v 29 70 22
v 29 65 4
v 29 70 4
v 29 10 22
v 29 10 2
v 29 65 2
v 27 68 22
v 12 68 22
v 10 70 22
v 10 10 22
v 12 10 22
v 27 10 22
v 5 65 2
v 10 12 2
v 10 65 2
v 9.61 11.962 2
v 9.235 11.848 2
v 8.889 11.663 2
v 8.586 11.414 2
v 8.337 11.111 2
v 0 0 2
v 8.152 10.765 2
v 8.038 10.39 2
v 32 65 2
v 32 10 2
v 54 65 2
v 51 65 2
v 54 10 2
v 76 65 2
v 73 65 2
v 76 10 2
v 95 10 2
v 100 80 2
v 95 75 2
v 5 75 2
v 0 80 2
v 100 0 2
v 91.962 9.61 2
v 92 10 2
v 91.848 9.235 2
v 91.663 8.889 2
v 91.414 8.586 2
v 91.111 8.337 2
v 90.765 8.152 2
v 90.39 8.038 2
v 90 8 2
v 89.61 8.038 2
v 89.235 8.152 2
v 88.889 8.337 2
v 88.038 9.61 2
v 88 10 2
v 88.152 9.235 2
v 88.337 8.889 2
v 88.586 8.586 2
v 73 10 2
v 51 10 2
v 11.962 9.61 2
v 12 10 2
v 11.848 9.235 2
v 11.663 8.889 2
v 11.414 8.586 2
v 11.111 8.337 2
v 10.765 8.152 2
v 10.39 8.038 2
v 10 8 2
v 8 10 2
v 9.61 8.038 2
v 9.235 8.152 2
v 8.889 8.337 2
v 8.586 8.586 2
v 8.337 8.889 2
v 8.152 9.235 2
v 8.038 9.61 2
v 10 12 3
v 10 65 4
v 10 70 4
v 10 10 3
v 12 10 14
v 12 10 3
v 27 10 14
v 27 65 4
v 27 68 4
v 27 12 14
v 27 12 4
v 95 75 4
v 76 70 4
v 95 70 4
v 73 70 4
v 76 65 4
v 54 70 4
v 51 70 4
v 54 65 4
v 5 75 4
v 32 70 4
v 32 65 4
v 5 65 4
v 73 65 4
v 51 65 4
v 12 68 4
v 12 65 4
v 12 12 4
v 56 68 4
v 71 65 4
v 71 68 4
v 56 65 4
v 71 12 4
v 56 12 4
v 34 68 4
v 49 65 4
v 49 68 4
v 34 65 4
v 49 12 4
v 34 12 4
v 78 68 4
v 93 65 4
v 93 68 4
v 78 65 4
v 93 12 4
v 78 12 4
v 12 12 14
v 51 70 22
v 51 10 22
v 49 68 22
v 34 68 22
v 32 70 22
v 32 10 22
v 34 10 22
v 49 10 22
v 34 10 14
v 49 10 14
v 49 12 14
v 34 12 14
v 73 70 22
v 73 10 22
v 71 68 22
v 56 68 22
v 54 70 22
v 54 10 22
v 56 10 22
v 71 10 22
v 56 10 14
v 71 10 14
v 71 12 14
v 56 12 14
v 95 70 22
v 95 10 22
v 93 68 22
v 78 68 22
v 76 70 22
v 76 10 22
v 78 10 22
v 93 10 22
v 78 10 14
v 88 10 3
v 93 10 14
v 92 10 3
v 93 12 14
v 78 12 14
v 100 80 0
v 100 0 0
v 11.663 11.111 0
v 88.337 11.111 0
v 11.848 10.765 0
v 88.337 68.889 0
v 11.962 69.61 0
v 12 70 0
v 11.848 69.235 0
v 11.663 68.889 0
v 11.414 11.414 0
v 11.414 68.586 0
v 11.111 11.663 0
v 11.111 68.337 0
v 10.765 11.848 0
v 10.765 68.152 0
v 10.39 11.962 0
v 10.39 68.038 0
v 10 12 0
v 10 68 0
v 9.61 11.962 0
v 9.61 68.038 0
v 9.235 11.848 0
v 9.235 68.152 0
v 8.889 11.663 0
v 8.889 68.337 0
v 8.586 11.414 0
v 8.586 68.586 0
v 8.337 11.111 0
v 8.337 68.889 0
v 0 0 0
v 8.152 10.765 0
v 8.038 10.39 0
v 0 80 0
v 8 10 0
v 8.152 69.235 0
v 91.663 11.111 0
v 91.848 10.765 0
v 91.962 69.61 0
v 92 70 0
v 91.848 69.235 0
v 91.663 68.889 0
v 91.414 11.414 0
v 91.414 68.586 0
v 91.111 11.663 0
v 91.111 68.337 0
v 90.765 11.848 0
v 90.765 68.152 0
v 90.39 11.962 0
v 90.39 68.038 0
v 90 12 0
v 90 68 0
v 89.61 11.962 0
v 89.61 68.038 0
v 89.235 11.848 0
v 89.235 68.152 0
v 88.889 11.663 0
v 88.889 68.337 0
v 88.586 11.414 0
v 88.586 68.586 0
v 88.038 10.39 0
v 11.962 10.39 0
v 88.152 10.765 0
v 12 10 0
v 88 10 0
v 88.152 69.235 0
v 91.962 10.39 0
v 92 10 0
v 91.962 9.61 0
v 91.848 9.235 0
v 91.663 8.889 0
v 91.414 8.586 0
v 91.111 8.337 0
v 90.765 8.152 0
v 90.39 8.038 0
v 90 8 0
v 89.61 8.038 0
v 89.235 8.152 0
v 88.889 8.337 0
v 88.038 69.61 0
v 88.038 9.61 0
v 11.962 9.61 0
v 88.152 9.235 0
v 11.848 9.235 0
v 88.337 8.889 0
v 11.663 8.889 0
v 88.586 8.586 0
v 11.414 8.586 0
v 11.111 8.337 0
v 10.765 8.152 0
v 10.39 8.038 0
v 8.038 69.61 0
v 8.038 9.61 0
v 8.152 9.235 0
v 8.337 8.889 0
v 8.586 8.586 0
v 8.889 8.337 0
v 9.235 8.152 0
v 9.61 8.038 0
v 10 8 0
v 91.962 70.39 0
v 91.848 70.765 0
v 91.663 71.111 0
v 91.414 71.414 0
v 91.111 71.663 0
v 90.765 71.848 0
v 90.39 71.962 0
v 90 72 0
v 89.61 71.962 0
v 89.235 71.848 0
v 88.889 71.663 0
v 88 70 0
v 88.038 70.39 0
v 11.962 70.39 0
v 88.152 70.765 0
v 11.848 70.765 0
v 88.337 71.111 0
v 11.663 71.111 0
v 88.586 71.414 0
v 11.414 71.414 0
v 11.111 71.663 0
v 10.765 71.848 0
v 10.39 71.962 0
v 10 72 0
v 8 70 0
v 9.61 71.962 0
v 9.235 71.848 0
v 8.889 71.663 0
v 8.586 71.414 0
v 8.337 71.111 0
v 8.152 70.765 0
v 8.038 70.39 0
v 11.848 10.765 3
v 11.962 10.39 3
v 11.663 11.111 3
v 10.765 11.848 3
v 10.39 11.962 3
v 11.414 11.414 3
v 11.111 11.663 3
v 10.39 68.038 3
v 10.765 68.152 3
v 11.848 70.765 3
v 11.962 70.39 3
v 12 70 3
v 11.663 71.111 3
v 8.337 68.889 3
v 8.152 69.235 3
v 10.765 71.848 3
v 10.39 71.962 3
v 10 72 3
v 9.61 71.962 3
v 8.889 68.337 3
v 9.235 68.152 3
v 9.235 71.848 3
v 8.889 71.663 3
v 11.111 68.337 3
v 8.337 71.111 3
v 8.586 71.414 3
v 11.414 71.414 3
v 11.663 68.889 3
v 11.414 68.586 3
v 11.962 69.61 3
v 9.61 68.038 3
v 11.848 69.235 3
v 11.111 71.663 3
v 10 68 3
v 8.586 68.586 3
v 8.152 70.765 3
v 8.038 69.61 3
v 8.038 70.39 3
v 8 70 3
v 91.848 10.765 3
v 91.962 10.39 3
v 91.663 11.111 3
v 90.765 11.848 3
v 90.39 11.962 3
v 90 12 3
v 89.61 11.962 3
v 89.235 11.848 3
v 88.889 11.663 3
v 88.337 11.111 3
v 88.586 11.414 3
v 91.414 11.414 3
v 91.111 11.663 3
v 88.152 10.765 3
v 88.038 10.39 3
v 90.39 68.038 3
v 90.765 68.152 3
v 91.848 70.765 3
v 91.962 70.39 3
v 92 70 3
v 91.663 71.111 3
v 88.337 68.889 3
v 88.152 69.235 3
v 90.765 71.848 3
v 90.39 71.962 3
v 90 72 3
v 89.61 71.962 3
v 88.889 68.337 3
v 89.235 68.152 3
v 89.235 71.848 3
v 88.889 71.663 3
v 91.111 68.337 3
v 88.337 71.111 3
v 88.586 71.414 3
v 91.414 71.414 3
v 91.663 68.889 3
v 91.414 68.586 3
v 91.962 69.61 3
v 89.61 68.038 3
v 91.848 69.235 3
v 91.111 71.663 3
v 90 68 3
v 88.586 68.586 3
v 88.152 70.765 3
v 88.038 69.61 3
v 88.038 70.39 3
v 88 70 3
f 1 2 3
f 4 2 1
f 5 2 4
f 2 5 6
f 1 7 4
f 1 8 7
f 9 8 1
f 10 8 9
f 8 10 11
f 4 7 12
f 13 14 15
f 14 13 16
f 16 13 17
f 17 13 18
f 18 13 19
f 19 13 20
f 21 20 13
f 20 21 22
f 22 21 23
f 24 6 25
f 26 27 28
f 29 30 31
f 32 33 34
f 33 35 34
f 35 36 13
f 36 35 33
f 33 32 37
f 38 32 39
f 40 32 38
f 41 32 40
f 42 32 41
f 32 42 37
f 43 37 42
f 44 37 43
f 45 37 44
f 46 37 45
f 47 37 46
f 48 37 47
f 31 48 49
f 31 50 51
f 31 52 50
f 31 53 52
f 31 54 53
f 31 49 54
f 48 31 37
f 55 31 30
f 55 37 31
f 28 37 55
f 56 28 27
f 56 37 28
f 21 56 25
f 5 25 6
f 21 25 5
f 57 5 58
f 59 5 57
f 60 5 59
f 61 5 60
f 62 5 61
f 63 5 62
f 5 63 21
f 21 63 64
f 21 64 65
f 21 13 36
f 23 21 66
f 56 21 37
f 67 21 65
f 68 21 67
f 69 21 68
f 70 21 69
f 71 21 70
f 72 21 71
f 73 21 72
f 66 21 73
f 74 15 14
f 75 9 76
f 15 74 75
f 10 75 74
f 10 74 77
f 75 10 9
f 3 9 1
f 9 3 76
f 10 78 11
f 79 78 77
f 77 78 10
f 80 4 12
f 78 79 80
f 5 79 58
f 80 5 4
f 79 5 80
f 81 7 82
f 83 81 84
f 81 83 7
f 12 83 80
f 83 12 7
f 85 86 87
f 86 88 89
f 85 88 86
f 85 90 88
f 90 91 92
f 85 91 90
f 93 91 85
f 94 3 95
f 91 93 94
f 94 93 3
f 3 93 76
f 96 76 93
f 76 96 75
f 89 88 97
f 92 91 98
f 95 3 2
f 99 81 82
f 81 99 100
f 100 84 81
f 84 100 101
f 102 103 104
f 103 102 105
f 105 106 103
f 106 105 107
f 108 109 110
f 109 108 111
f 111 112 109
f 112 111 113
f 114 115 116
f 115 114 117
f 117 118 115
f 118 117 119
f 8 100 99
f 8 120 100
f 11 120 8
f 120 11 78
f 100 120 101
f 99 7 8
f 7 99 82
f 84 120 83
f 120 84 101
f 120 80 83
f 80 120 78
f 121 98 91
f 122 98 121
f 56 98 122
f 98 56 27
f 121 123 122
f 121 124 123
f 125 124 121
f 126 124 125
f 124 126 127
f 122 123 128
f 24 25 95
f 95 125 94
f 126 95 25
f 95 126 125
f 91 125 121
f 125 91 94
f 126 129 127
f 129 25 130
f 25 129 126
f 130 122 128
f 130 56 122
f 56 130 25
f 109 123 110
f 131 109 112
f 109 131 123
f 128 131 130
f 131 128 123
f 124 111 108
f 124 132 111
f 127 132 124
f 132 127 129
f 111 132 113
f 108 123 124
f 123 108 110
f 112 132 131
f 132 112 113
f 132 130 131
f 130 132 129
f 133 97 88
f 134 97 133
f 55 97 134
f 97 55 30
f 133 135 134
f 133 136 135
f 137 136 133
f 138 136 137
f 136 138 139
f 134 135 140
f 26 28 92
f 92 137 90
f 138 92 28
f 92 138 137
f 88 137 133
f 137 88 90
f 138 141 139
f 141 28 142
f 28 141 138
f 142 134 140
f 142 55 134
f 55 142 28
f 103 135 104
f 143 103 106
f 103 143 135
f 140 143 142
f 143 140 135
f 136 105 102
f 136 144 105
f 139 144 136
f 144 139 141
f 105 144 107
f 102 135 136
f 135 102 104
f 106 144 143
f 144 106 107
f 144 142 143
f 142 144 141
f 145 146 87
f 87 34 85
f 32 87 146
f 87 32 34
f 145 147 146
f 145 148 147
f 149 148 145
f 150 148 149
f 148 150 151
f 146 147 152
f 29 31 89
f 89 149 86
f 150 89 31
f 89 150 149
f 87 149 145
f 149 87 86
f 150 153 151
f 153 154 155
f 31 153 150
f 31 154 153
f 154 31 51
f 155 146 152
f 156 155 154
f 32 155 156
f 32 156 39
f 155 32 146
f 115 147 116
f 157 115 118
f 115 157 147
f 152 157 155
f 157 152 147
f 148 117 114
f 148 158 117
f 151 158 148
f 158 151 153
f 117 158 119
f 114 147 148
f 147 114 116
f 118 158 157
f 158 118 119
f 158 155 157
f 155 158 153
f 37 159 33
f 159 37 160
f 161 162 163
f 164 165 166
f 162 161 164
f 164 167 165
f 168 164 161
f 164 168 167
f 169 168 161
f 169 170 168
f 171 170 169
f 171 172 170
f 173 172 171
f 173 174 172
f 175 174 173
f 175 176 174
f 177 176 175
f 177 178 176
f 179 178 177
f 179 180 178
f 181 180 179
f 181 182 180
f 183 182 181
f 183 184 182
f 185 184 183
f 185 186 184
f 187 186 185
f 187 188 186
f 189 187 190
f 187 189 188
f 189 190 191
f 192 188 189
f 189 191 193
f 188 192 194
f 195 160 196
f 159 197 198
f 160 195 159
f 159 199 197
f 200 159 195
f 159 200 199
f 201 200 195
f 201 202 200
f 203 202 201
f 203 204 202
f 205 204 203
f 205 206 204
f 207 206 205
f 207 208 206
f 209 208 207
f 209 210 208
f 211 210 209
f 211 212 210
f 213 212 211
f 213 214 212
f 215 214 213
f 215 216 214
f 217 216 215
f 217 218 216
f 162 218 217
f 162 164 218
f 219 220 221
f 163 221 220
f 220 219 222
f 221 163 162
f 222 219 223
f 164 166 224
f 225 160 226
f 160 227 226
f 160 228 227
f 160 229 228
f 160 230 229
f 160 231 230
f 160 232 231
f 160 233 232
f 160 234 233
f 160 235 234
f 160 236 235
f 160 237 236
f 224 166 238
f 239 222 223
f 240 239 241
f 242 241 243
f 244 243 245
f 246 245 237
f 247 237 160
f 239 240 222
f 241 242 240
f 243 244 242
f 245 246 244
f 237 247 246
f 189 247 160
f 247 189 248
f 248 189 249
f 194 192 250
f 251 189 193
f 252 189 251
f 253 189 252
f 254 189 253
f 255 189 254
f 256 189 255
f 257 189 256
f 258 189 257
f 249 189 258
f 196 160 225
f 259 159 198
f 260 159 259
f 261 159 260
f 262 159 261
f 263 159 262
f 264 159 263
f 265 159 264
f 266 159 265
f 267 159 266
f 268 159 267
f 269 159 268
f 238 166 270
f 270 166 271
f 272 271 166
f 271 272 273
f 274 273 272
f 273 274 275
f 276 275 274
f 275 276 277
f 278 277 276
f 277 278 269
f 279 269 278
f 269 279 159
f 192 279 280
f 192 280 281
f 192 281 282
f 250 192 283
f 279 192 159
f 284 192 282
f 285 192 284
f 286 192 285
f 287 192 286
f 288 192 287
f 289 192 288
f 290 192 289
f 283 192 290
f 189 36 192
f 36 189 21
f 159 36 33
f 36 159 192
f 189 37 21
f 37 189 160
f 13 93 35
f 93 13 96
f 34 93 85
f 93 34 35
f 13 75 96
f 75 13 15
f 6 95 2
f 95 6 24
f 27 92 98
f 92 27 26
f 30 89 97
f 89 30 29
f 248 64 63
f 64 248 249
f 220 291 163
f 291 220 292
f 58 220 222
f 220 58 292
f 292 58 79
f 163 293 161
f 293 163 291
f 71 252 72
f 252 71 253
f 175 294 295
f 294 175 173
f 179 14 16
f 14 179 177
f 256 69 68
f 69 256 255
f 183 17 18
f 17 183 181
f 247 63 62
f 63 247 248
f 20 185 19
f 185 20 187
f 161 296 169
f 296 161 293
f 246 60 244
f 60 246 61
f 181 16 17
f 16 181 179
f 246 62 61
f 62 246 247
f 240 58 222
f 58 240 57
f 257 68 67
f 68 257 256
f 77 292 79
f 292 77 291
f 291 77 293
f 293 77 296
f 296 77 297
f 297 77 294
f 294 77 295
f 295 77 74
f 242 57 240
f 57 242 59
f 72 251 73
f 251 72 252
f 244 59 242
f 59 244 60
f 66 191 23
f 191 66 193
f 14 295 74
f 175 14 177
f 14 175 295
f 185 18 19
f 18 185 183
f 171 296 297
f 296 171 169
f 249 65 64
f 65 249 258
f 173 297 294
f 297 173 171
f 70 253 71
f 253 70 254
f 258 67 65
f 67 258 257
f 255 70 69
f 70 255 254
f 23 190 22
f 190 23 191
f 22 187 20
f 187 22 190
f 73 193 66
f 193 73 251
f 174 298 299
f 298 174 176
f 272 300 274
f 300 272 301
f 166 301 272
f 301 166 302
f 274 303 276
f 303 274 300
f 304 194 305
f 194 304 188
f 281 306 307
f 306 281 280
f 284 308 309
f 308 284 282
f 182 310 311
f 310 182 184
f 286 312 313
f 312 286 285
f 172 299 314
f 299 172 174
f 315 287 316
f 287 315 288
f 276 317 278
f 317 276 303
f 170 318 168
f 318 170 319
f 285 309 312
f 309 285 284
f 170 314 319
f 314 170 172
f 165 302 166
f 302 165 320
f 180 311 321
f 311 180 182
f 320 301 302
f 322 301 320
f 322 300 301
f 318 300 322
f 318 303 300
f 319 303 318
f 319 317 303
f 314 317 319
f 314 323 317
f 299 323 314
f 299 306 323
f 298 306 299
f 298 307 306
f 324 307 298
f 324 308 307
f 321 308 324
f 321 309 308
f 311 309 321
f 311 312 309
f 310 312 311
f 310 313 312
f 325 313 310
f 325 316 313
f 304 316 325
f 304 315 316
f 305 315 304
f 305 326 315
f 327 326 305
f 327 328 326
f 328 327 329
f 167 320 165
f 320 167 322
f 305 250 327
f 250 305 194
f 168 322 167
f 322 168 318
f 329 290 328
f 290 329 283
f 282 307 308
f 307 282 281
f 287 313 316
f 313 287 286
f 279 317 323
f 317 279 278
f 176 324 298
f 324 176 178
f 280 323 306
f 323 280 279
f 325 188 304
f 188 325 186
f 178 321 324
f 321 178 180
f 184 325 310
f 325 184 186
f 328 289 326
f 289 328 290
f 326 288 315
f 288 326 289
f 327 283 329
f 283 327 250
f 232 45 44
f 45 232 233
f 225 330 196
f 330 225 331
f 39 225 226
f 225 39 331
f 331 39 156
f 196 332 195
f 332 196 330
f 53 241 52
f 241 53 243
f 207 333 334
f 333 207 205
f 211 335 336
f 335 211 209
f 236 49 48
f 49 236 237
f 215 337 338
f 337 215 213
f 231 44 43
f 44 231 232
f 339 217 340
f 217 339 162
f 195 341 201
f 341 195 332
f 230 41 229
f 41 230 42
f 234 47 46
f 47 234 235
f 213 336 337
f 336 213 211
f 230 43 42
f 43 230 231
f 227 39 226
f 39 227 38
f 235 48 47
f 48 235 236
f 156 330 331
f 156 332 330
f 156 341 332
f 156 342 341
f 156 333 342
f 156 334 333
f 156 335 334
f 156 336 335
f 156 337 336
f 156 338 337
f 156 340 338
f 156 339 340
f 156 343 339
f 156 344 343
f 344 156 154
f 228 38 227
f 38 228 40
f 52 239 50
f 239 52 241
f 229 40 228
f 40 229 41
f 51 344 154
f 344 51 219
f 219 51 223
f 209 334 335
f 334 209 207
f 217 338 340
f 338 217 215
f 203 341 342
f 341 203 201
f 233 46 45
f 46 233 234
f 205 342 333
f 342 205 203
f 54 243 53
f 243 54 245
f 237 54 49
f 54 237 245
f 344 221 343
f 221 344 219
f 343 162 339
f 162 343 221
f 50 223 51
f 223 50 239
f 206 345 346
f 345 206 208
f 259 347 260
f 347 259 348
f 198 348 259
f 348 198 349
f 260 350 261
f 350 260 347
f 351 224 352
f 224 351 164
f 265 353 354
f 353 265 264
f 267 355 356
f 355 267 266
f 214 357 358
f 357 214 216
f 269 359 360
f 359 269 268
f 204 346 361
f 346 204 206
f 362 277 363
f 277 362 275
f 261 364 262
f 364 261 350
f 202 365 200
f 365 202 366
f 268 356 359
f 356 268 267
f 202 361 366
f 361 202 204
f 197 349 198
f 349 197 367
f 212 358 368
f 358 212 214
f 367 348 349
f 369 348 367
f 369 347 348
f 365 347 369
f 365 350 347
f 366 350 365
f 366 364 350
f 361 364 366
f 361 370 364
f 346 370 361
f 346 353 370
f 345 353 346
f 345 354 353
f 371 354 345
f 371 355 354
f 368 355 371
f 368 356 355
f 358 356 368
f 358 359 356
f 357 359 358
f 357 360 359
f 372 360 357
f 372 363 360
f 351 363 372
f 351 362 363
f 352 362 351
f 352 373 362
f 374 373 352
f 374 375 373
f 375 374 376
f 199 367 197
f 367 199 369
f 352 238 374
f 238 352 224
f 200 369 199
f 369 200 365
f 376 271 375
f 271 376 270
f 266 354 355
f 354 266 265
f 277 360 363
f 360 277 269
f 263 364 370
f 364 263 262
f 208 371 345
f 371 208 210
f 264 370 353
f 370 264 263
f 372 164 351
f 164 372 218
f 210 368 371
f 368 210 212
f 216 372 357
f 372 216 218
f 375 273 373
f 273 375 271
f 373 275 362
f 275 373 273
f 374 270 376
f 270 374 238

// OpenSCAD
// Example: Cable Organizer Using Config File
// This demonstrates how to use config.scad for consistent customization

// Include the global configuration
// Uncomment the line below to use shared config:
// use <config.scad>

// If using config.scad, these values come from there.
// If not using config, these are the defaults:

// From config (or use these defaults)
wall_thickness = 2;
base_width = 80;
base_length = 100;
base_height = 2;
channel_width = 15;
channel_height = 20;
num_channels = 4;
mounting_hole_diameter = 4;

// Example: To use config values, uncomment use statement above
// Then these would automatically use config.scad values:
// wall_thickness (from config)
// base_width = cable_org_width (from config)
// base_length = cable_org_length (from config)
// num_channels = cable_org_channels (from config)

// Main module
module cable_organizer() {
    difference() {
        union() {
            // Base plate
            cube([base_length, base_width, base_height]);
            
            // Channels for cables
            for (i = [0:num_channels-1]) {
                translate([10 + i * 22, 10, base_height]) {
                    difference() {
                        // Outer channel
                        cube([channel_width + wall_thickness * 2, 
                              base_width - 20, 
                              channel_height]);
                        
                        // Inner channel cutout
                        translate([wall_thickness, wall_thickness, wall_thickness]) {
                            cube([channel_width, 
                                  base_width - 20 - wall_thickness * 2, 
                                  channel_height]);
                        }
                        
                        // Front opening (entrance for cables)
                        translate([wall_thickness, 0, channel_height - 8]) {
                            cube([channel_width, wall_thickness + 1, 10]);
                        }
                    }
                }
            }
            
            // Label area
            translate([5, base_width - 15, base_height]) {
                cube([base_length - 10, 10, 2]);
            }
        }
        
        // Mounting holes
        for (x = [10, base_length - 10]) {
            for (y = [10, base_width - 10]) {
                translate([x, y, -1]) {
                    cylinder(h = base_height + 2, d = mounting_hole_diameter, $fn = 32);
                }
            }
        }
    }
}

// Render the cable organizer
cable_organizer();

// USAGE NOTES:
// 1. To use config.scad: Uncomment the 'use <config.scad>' line at the top
// 2. Then replace the parameter values with config variable names
// 3. All models can share the same configuration
// 4. Update config.scad once to change all models consistently
